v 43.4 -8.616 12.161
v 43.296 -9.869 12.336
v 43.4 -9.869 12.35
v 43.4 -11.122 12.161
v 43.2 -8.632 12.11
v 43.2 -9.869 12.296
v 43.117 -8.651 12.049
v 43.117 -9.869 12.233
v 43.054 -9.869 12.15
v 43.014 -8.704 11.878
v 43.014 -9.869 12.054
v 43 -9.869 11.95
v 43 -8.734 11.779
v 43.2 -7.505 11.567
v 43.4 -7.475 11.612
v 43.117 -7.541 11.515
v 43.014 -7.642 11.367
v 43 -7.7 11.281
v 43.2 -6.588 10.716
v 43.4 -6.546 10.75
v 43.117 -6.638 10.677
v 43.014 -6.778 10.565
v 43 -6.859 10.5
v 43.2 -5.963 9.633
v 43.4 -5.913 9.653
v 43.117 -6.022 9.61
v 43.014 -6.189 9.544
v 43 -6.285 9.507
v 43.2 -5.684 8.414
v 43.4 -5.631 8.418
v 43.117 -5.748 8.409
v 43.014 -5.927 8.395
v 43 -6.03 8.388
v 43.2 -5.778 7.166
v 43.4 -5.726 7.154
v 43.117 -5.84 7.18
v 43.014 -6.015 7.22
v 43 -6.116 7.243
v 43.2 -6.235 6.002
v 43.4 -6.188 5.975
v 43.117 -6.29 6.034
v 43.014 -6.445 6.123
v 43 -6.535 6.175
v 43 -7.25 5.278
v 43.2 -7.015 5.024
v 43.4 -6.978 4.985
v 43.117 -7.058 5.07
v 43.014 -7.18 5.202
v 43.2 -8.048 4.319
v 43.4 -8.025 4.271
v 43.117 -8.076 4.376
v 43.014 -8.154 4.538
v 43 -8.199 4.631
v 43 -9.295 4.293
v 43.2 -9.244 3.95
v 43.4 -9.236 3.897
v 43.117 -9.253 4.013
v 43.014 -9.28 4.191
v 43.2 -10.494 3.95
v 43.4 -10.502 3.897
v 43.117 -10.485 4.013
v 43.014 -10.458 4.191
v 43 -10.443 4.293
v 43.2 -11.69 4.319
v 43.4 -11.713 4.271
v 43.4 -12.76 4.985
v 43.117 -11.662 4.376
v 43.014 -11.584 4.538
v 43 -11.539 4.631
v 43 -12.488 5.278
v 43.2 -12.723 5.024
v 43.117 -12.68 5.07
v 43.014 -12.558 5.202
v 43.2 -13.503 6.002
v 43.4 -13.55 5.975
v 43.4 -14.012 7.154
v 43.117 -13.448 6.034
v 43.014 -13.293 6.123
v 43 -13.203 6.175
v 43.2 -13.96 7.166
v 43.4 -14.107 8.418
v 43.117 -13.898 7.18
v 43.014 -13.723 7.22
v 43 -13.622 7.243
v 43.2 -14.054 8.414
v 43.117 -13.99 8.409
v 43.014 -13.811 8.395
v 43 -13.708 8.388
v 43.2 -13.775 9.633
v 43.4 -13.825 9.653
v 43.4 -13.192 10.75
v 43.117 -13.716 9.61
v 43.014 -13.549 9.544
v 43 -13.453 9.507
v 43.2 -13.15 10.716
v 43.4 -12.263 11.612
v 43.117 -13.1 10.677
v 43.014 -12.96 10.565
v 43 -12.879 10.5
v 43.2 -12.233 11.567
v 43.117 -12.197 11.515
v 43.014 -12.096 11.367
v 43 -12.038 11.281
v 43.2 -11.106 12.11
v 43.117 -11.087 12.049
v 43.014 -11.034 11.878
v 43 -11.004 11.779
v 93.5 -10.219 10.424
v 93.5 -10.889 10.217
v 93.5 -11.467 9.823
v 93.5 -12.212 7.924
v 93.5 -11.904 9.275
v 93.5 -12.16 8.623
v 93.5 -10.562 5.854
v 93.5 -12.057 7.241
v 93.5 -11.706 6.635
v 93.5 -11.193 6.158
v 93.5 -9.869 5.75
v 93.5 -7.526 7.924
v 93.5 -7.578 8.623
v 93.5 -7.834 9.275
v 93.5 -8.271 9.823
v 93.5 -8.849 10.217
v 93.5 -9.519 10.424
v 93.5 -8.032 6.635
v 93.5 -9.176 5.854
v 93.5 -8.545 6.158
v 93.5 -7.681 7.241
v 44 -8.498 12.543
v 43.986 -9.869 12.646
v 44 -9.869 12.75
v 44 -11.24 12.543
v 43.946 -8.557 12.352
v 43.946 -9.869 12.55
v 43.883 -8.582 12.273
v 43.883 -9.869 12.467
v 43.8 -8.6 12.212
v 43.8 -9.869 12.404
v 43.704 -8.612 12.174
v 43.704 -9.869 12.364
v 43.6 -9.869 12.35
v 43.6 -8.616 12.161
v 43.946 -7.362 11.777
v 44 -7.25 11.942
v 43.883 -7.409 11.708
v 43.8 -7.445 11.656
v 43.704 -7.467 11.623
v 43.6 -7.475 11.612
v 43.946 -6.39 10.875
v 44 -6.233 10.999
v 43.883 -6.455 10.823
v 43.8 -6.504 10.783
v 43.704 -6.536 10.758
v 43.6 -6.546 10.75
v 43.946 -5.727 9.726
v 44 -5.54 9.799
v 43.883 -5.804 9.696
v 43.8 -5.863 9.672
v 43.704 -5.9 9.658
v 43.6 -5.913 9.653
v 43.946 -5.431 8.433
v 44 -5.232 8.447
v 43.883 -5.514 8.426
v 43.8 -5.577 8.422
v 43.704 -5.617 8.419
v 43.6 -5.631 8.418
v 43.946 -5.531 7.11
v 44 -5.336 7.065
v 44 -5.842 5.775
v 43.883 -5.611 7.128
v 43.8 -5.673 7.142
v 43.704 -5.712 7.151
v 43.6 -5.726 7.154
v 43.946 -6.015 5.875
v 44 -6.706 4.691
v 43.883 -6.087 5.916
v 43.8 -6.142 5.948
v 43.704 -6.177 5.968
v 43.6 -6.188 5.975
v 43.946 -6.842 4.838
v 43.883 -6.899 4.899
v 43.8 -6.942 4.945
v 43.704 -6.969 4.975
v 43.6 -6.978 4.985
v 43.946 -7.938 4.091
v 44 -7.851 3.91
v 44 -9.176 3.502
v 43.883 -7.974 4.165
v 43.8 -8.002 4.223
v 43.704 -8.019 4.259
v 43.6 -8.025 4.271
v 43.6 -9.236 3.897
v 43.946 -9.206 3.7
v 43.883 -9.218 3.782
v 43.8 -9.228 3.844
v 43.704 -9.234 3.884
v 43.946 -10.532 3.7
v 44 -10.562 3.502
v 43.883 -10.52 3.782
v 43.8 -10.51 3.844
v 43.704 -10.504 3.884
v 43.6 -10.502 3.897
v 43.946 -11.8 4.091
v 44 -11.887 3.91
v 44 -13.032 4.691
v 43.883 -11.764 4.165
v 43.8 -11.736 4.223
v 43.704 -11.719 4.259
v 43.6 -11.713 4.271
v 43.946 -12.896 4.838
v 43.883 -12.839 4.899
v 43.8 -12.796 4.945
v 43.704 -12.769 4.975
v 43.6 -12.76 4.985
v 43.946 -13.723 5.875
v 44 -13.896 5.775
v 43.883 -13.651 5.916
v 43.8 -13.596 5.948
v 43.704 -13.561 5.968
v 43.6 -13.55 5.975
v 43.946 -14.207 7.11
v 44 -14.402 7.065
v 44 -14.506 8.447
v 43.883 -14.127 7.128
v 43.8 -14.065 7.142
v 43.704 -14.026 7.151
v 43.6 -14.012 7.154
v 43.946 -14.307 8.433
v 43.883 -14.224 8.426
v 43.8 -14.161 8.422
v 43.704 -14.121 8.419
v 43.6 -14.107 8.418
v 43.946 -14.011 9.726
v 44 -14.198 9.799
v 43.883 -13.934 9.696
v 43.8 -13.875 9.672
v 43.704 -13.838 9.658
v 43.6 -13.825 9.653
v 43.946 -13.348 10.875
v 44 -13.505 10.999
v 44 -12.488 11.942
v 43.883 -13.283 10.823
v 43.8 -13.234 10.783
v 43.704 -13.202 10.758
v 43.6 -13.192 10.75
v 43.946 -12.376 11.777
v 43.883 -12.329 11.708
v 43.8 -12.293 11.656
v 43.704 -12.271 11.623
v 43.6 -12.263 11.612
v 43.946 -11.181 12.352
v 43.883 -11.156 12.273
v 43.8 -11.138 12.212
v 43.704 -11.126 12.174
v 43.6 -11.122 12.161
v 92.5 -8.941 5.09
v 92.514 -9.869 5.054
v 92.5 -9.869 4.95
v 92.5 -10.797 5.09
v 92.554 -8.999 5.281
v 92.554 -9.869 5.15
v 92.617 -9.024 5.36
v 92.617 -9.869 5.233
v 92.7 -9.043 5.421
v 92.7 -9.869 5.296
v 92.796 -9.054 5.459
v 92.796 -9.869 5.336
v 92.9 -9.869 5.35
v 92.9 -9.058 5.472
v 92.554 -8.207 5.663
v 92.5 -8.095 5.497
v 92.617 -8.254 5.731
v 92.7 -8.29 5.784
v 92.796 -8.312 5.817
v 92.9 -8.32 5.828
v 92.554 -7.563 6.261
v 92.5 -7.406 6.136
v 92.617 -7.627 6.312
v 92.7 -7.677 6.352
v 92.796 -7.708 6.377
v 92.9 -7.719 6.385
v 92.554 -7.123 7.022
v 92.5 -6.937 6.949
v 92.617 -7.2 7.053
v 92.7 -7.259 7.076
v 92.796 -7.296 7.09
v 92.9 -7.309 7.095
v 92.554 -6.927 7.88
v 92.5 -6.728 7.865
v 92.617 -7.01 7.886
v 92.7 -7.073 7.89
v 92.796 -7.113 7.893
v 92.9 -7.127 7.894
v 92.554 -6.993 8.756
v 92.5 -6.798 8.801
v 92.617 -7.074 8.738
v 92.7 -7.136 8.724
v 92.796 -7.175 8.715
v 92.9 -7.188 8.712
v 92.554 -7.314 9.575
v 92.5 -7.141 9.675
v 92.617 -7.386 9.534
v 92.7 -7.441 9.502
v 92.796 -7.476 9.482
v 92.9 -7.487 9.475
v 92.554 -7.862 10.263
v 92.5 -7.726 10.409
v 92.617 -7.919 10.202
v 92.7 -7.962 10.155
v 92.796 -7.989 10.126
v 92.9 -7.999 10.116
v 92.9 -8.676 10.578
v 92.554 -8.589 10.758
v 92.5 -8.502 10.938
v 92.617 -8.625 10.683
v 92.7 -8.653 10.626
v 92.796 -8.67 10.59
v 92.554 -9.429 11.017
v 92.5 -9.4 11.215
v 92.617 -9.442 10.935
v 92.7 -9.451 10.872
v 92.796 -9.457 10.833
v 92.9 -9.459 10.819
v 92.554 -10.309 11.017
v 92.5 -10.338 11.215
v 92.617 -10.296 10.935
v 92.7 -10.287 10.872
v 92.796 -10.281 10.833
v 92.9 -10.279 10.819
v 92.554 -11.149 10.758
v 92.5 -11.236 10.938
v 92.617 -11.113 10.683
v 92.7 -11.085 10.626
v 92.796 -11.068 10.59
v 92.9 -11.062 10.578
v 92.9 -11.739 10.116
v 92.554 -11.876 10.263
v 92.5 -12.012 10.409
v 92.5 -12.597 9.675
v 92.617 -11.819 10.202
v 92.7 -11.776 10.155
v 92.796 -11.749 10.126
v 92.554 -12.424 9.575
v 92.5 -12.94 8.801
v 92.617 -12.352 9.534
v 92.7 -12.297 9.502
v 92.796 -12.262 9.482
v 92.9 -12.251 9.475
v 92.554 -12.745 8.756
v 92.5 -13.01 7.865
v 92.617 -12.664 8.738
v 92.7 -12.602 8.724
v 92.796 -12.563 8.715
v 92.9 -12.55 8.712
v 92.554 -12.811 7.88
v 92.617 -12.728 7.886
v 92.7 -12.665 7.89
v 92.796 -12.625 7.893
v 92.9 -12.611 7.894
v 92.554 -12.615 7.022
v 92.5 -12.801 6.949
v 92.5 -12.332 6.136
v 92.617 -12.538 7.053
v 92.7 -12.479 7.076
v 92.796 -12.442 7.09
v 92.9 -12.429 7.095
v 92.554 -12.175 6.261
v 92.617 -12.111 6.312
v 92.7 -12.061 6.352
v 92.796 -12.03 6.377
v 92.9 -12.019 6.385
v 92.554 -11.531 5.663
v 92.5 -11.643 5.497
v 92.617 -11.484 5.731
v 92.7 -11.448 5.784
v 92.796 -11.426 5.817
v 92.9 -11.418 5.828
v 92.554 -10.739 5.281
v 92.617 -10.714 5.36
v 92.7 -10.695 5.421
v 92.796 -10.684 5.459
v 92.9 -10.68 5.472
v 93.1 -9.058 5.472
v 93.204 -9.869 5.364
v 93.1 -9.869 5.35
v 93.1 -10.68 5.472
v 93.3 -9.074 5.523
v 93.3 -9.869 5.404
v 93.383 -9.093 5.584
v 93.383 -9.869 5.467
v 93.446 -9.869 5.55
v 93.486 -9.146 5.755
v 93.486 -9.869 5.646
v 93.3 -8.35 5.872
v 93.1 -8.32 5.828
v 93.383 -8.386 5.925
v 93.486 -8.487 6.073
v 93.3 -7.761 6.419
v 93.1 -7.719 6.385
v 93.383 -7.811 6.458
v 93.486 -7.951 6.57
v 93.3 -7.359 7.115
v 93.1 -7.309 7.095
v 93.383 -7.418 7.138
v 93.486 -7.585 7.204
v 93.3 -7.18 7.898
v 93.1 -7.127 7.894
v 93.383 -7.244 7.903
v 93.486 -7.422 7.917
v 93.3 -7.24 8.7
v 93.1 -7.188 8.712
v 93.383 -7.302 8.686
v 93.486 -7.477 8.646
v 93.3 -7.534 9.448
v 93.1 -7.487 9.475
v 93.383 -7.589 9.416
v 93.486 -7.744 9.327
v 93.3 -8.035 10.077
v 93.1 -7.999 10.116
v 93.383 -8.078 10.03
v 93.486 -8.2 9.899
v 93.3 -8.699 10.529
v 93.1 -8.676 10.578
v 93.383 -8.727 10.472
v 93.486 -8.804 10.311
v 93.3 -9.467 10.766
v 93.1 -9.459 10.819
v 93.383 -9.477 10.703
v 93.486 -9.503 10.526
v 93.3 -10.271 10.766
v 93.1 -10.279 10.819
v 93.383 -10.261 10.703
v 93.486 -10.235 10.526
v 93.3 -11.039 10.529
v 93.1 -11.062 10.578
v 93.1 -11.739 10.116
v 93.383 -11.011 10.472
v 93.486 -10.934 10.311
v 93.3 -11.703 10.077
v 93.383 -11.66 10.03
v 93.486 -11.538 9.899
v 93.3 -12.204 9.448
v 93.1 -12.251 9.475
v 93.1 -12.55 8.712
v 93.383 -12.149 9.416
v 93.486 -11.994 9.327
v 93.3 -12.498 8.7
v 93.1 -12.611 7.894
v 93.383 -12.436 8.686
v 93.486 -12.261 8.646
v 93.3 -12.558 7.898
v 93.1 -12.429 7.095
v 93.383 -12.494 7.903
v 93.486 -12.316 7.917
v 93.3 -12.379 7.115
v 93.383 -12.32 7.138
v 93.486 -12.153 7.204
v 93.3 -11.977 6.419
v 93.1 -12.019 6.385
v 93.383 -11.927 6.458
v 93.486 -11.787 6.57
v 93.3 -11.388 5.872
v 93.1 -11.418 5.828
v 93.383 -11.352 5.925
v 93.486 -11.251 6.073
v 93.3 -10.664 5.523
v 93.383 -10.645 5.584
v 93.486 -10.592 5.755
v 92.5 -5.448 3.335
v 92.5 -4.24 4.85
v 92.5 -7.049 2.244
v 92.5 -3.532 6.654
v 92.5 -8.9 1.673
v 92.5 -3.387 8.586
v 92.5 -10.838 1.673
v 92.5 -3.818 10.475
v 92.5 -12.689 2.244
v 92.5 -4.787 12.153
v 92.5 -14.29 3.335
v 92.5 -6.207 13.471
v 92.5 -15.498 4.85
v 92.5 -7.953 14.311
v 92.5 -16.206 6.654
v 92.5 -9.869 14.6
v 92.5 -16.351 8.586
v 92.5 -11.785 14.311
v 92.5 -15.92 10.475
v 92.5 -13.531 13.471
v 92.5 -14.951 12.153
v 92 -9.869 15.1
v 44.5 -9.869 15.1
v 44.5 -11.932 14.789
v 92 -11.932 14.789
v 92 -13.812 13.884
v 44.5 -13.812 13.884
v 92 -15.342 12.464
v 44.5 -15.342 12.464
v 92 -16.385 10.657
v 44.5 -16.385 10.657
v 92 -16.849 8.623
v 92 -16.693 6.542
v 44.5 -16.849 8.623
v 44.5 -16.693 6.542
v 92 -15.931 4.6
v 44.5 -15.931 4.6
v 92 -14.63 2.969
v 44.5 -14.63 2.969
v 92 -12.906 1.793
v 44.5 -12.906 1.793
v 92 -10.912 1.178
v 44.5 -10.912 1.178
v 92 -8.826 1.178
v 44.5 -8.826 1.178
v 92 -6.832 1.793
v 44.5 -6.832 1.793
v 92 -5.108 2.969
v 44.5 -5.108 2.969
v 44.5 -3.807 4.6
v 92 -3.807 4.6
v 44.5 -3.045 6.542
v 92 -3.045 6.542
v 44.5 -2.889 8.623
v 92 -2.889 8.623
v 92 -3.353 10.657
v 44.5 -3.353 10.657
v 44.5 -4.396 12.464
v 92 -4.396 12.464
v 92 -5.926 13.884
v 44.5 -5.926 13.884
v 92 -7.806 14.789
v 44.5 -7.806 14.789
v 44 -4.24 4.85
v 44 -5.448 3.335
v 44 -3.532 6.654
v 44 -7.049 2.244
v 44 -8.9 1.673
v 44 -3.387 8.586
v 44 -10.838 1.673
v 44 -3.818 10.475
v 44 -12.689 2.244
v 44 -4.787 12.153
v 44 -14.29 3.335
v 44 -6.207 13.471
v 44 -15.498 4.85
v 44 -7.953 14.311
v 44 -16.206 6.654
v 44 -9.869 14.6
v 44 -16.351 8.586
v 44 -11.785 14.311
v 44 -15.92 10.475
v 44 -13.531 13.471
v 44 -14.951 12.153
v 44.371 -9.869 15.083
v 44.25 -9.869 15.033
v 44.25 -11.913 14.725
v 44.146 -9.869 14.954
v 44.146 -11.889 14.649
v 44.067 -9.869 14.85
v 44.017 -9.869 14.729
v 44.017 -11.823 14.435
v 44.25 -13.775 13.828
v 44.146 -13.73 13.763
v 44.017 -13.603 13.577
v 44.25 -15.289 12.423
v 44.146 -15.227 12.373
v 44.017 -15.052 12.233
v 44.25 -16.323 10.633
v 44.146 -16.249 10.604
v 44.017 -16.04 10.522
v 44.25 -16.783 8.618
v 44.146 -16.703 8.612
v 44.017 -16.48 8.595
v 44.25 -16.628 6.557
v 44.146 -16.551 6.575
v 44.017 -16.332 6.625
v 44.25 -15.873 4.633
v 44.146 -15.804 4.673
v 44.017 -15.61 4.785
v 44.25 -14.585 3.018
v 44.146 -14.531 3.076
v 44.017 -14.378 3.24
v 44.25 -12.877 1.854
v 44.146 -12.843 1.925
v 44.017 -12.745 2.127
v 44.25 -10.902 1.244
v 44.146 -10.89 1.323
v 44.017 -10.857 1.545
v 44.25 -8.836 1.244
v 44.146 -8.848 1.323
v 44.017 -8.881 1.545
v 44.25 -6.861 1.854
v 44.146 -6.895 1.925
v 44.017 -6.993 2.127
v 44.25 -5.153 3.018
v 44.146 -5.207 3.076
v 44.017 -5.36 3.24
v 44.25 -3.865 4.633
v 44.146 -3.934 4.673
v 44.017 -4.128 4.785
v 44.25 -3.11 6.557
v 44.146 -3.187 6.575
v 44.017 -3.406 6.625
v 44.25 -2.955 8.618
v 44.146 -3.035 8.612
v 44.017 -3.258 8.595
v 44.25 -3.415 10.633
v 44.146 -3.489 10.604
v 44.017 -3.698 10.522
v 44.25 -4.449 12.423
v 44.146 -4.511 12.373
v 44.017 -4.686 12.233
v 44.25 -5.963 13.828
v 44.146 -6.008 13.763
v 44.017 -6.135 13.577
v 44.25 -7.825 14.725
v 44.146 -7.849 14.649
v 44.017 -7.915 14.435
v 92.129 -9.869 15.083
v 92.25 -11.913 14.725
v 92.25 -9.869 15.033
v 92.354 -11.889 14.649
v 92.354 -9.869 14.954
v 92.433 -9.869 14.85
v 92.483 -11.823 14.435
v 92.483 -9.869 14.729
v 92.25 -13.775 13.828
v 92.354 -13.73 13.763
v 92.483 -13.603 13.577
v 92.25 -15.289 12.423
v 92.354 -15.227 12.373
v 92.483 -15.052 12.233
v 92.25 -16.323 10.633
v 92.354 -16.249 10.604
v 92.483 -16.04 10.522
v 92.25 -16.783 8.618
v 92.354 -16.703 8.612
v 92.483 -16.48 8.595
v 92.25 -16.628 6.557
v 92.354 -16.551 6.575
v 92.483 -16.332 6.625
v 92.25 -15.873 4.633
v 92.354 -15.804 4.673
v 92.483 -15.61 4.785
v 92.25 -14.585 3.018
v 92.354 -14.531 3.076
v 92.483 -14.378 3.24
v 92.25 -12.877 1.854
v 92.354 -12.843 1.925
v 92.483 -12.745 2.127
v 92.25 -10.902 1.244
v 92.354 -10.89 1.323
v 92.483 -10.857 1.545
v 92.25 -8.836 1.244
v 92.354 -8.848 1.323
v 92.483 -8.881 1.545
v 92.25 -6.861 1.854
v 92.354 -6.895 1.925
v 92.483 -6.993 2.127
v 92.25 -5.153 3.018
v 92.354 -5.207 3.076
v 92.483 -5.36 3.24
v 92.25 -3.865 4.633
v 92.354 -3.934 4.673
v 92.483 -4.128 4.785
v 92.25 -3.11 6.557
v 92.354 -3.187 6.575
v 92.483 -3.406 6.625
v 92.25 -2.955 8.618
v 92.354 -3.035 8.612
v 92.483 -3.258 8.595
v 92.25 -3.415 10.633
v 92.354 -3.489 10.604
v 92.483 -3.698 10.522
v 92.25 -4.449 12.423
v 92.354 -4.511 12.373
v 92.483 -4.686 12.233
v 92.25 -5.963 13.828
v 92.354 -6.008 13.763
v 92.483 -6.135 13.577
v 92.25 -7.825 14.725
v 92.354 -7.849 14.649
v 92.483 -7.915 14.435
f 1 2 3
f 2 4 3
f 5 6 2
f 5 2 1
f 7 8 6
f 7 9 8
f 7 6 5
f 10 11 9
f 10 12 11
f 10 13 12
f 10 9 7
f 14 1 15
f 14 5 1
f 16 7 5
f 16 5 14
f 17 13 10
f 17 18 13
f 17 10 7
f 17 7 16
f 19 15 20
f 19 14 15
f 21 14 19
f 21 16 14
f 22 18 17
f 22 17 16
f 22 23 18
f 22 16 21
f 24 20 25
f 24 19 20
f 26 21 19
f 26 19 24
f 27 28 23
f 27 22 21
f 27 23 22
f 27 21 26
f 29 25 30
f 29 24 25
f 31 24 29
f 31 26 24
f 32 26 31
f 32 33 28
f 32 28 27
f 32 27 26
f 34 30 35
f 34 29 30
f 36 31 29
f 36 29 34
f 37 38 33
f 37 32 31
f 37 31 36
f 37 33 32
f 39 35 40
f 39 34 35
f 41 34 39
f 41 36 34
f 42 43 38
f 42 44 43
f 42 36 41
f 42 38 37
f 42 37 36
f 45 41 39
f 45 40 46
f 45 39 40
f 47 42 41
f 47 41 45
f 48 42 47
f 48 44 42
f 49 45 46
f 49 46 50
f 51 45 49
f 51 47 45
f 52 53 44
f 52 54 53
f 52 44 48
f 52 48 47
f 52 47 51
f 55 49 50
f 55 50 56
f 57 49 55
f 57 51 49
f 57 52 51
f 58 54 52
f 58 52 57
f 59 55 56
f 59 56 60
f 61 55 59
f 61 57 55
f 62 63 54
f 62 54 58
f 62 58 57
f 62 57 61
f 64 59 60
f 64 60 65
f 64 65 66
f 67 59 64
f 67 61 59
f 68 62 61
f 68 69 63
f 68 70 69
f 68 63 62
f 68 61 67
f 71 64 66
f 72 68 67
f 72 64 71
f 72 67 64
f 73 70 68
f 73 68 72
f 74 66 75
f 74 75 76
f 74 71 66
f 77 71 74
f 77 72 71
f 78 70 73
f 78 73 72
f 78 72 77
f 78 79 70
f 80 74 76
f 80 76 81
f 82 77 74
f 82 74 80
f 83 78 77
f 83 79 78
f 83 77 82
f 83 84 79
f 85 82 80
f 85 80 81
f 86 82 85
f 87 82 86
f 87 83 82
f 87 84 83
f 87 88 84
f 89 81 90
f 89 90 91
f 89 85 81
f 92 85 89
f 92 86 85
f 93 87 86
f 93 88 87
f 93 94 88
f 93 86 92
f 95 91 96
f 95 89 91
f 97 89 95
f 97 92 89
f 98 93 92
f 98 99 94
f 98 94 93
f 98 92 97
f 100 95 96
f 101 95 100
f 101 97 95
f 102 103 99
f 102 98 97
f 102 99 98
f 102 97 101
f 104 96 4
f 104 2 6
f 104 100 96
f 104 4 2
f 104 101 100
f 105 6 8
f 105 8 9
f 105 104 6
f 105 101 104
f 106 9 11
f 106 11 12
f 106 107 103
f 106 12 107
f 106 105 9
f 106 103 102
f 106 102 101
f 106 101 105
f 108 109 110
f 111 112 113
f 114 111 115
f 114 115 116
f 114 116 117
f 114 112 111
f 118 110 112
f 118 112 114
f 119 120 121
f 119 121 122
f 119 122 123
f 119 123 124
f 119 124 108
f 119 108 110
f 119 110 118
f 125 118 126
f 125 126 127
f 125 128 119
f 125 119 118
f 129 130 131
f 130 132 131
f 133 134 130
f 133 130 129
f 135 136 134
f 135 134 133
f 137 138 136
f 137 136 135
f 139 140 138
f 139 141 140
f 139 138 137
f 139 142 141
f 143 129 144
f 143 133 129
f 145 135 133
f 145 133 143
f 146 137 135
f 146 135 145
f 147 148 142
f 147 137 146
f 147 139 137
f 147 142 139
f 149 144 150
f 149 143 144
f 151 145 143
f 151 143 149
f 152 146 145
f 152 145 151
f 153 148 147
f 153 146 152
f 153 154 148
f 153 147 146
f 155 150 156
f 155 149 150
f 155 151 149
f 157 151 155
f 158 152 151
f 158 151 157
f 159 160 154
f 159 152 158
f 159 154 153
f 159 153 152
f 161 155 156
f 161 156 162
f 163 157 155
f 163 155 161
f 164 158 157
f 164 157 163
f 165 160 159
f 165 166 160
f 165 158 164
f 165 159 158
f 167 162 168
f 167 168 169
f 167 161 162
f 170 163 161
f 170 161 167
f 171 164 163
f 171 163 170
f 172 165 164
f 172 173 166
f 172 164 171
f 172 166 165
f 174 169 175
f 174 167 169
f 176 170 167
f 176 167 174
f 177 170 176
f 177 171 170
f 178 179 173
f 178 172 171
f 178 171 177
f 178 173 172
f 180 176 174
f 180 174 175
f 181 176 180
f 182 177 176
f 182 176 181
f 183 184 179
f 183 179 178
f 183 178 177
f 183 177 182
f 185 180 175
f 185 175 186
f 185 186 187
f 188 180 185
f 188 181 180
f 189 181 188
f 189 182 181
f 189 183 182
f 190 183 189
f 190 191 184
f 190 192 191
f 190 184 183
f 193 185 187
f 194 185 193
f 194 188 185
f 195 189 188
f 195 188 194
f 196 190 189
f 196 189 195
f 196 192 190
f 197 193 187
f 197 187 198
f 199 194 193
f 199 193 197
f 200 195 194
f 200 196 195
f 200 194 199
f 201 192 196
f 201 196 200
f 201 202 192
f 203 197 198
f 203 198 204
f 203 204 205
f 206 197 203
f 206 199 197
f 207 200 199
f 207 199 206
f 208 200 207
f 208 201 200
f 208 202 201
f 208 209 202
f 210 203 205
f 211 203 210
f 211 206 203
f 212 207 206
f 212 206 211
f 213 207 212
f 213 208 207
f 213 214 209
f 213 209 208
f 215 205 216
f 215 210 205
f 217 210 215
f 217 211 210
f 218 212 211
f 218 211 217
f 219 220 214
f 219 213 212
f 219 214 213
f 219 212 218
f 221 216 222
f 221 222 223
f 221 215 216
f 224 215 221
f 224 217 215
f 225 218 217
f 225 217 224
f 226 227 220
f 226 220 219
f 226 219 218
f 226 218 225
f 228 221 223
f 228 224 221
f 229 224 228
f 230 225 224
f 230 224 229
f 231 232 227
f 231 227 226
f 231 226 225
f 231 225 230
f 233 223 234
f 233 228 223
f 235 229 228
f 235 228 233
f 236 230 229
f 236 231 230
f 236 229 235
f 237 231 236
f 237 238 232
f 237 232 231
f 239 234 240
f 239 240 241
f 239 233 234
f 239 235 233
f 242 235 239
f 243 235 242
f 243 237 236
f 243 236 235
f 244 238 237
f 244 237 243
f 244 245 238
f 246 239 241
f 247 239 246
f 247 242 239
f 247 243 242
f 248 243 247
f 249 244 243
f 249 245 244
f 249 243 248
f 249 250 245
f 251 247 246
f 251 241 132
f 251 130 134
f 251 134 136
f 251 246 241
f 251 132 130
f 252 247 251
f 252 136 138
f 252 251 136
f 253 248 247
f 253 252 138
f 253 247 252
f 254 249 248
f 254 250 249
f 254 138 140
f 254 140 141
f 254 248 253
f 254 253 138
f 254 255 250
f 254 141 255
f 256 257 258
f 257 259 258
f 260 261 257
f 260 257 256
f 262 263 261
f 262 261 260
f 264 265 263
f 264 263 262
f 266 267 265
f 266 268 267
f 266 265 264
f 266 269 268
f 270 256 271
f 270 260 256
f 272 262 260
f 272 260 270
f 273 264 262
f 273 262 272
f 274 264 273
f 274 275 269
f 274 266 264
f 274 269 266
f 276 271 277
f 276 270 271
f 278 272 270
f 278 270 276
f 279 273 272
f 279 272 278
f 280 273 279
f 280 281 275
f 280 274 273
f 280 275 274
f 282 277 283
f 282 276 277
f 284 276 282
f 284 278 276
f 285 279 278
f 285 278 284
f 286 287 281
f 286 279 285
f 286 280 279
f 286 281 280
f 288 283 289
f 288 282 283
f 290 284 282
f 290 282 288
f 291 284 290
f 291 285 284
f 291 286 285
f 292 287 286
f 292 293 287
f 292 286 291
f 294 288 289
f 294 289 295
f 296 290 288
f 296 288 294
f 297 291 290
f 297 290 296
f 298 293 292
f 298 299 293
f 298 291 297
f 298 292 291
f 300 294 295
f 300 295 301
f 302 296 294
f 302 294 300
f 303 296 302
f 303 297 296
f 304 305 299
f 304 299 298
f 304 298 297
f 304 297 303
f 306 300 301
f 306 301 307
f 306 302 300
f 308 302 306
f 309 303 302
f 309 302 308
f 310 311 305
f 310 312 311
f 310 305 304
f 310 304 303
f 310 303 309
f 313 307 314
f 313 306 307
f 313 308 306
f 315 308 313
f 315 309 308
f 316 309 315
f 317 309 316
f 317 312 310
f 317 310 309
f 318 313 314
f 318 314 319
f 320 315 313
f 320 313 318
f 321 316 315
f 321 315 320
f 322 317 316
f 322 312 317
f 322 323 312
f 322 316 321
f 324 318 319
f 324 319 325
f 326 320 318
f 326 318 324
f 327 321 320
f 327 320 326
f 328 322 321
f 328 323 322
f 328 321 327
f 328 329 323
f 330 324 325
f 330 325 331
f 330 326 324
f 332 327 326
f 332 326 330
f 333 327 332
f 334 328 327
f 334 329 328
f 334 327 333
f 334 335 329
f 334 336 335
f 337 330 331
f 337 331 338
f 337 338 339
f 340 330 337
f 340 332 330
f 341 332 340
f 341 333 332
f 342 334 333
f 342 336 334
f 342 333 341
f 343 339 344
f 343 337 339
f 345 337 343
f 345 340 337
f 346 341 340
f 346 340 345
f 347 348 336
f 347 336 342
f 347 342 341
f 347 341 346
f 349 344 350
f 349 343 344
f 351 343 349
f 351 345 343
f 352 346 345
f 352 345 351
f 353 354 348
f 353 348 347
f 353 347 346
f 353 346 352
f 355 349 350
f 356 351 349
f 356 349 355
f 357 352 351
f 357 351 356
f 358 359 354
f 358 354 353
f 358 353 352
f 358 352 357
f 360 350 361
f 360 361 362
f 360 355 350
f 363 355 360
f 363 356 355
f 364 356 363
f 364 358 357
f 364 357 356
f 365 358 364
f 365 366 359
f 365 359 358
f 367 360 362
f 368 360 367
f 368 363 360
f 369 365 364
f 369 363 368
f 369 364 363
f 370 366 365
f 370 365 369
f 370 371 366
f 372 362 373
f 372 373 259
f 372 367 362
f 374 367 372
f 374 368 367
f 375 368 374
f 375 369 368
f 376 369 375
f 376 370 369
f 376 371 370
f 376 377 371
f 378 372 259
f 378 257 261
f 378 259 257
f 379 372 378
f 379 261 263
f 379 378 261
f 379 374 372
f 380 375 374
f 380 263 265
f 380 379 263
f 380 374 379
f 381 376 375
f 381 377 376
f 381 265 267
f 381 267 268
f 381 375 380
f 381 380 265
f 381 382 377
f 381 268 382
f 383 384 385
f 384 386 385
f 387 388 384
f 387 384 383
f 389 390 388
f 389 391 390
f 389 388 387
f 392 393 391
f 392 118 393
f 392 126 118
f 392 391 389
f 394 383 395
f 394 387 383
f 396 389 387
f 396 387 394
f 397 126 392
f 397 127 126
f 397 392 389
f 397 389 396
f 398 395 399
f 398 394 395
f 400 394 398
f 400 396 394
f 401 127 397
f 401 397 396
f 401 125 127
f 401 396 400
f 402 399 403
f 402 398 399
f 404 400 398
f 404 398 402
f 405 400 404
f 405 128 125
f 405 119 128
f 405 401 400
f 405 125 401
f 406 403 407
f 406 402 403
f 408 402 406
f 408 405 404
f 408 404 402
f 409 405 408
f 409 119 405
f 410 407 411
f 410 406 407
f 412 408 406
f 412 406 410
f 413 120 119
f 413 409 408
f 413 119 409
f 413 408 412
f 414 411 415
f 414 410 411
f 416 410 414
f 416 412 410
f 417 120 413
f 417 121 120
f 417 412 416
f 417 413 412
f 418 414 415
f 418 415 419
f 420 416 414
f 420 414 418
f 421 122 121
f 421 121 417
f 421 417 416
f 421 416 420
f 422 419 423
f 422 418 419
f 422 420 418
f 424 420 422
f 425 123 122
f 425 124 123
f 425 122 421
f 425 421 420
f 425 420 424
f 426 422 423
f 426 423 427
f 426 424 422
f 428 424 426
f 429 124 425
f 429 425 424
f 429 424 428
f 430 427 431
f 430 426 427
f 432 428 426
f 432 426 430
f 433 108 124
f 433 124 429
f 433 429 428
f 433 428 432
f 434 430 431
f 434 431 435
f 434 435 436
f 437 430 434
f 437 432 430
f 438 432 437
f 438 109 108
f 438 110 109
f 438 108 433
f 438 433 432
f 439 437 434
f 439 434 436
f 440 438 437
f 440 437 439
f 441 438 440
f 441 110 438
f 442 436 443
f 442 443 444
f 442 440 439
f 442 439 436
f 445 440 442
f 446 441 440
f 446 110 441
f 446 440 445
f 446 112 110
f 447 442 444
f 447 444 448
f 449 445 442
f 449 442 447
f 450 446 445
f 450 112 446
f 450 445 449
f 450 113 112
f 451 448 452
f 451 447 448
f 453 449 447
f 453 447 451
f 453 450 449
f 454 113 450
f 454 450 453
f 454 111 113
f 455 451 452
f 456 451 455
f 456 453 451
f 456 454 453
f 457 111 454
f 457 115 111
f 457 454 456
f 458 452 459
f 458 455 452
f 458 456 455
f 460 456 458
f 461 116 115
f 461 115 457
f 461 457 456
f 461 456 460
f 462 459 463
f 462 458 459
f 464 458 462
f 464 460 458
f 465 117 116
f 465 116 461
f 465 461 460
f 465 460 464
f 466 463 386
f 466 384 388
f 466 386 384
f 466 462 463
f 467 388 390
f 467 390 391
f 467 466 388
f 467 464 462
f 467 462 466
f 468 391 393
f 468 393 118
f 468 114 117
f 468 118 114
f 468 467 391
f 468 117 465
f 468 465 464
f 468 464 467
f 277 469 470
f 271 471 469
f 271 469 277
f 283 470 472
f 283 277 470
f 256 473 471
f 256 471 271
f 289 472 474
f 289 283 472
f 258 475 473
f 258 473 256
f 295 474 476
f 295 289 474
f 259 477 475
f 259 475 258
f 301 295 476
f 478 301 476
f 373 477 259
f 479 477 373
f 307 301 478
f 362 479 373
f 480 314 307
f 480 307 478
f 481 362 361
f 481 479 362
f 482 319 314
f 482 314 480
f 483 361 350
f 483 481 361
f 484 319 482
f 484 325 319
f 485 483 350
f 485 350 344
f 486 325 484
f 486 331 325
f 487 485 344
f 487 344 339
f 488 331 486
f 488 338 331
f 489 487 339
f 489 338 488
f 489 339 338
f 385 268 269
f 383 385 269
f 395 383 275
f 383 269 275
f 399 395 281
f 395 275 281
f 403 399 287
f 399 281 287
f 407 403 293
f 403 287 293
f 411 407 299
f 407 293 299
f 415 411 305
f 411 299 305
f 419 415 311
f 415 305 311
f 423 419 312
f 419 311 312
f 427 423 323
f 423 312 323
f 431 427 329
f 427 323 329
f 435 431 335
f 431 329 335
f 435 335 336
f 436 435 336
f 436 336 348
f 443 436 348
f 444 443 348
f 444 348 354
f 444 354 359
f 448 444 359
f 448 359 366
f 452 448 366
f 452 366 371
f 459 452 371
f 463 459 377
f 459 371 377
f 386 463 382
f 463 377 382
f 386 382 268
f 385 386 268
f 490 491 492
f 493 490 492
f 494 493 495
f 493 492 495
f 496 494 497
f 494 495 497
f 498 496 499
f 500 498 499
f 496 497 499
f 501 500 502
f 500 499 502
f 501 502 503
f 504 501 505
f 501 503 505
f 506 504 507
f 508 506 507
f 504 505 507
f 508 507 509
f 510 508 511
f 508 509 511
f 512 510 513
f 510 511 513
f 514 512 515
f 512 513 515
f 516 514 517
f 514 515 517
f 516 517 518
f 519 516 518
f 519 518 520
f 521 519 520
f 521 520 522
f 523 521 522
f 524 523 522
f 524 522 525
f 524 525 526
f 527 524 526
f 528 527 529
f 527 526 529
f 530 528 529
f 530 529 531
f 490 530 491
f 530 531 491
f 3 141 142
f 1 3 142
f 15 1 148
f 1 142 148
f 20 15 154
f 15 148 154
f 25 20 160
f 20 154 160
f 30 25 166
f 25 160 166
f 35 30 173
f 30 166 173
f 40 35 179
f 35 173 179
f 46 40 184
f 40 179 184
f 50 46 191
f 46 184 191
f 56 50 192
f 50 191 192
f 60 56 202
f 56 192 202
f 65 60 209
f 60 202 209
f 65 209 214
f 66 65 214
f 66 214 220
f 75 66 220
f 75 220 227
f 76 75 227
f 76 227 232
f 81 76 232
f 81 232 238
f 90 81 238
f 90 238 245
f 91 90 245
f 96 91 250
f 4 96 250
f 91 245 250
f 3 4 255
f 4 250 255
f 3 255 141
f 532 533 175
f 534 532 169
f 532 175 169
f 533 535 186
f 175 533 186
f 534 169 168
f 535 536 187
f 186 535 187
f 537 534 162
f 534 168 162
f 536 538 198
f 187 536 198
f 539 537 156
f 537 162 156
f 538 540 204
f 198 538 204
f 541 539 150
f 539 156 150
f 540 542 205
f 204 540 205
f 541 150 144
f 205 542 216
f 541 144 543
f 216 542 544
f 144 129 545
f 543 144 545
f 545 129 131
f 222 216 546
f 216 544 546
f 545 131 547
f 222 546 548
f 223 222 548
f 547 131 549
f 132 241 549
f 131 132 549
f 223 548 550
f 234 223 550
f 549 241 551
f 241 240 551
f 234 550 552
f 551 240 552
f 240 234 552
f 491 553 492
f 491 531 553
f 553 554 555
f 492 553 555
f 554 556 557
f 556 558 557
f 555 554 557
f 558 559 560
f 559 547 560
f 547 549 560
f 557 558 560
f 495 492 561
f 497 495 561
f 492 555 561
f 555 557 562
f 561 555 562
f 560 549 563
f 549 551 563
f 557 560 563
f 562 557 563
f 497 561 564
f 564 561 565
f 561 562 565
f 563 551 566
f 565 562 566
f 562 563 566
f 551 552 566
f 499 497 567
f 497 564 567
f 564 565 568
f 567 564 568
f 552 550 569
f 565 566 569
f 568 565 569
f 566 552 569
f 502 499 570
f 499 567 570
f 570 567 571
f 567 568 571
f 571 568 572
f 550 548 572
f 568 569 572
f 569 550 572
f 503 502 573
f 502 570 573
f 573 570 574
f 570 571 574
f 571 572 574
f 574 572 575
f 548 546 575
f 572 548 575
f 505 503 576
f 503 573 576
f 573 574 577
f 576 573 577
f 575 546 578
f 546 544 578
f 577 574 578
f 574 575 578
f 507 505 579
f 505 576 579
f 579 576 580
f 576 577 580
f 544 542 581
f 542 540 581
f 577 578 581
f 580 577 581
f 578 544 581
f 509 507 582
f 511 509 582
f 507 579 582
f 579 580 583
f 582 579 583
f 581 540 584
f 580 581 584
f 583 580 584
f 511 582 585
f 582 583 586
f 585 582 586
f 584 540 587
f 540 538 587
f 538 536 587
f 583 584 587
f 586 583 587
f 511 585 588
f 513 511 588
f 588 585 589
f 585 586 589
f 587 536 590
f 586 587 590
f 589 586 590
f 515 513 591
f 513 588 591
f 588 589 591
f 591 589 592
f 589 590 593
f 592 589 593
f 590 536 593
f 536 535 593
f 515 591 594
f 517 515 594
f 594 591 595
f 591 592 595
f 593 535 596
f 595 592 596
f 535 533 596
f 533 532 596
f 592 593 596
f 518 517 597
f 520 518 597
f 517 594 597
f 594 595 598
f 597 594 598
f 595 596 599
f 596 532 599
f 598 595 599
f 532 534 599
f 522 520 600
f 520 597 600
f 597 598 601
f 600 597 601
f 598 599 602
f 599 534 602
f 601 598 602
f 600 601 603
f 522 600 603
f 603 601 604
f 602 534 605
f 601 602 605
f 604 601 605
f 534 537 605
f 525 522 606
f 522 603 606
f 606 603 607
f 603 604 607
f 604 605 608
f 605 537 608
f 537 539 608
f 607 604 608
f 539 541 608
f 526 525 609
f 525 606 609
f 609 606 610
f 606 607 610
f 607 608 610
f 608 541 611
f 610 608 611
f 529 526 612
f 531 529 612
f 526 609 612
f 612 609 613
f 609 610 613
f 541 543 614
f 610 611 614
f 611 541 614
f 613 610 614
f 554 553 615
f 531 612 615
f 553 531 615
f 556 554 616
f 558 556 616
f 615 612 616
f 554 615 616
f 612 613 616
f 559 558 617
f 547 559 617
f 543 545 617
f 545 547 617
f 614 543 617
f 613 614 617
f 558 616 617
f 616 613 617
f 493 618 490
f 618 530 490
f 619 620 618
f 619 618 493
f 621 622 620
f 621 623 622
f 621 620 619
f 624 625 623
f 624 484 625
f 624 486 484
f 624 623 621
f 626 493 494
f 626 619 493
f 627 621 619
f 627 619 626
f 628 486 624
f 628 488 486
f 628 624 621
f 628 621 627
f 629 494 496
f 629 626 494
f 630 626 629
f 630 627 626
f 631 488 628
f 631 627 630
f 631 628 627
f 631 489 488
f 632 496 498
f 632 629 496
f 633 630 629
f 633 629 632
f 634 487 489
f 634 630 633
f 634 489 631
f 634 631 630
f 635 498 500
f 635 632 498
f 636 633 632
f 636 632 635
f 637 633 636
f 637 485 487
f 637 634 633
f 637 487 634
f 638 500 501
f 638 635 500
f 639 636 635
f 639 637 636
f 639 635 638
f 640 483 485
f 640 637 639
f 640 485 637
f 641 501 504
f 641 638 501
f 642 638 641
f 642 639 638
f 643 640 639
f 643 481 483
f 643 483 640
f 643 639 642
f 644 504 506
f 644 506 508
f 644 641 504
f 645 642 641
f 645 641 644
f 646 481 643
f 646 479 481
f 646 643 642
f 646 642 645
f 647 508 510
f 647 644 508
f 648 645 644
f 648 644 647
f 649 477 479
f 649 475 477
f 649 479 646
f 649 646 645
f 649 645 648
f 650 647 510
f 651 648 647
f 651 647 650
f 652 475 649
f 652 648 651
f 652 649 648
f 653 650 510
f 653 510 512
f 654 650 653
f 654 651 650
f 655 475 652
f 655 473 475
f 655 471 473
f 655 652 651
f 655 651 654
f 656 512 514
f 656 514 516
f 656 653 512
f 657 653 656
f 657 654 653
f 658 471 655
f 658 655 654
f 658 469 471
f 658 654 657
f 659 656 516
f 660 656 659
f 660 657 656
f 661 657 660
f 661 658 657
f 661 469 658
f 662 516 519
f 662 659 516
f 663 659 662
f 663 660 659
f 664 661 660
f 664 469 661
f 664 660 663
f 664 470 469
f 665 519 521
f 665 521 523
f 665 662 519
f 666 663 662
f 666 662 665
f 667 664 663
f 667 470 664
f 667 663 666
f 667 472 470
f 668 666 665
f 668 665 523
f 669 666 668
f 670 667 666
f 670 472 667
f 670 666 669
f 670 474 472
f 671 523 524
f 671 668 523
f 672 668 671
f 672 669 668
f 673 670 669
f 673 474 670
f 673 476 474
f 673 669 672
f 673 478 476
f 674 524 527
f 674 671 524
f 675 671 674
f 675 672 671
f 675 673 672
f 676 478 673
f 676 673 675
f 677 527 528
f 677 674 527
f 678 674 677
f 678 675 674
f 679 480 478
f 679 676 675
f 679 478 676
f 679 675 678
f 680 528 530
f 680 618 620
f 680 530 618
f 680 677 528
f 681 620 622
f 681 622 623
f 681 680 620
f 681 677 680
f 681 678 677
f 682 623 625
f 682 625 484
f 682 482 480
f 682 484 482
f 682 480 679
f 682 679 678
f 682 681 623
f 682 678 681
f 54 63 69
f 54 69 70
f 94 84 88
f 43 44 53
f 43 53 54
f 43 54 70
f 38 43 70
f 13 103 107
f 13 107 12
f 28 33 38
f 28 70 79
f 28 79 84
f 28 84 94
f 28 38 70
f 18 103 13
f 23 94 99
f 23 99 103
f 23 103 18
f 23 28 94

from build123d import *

# Parameters (mm, degrees)
BOSS_EXTRUDE1_DEPTH     = 2.75
SKETCH2_W               = 120
SKETCH2_H               = 29
CUT_EXTRUDE1_DEPTH      = 0.125
SKETCH3_W               = 120
SKETCH3_H               = 29
BOSS_EXTRUDE2_DEPTH     = 0.125
CUT_EXTRUDE2_DEPTH      = 1.356
FILLET1_R               = 2
BOSS_EXTRUDE3_DEPTH     = 0.1
SKETCH6_W               = 0.5
SKETCH6_H               = 5
BOSS_EXTRUDE4_DEPTH     = 0.1
BOSS_EXTRUDE4_2_DEPTH   = 0.1
BOSS_EXTRUDE4_3_DEPTH   = 0.1
SKETCH7_W               = 30
SKETCH7_H               = 10
BOSS_EXTRUDE5_DEPTH     = 0.1
SKETCH8_RX              = 5
SKETCH8_RY              = 4
CUT_EXTRUDE3_DEPTH      = 1.15
CUT_EXTRUDE4_DEPTH      = 121.904145917
CUT_EXTRUDE4_DEPTH_BACK = 121.904145917
SKETCH9_W               = 0.2
SKETCH9_H               = 2
SKETCH10_W              = 120
SKETCH10_H              = 29
BOSS_EXTRUDE6_DEPTH     = 1.619
BOSS_EXTRUDE7_START     = 45
SKETCH11_R              = 7
BOSS_EXTRUDE7_DEPTH     = 48.5
SKETCH12_R              = 4.25
BOSS_EXTRUDE8_DEPTH     = 1
SKETCH13_R              = 2.75
BOSS_EXTRUDE9_DEPTH     = 1
BOSS_EXTRUDE10_START    = 44
SKETCH14_R              = 7
BOSS_EXTRUDE10_DEPTH    = 48.5
SKETCH15_R              = 2.75
BOSS_EXTRUDE11_DEPTH    = 1
SKETCH16_R              = 4.25
BOSS_EXTRUDE12_DEPTH    = 1
FILLET2_R               = 0.5
FILLET3_R               = 0.5
FILLET4_R               = 0.4
FILLET5_R               = 0.4
FILLET6_R               = 0.4
FILLET7_R               = 0.4


with BuildPart() as part:
    # Sketch1 → Boss-Extrude1 (new body)
    with BuildSketch(Plane(origin=(0, 0, 0), x_dir=(1, 0, 0), z_dir=(0, 1, 0))):
        Polygon((0, 0), (0, -14.5), (120, -14.5), (120, 14.5), (0, 14.5), align=None)
    extrude(amount=BOSS_EXTRUDE1_DEPTH)

    # Sketch2 → Cut-Extrude1 (cut)
    with BuildSketch(Plane(origin=(0, 2.75, 0), x_dir=(1, 0, 0), z_dir=(0, 1, 0))):
        with Locations((60, 0)):
            Rectangle(SKETCH2_W, SKETCH2_H)
    extrude(amount=-CUT_EXTRUDE1_DEPTH, mode=Mode.SUBTRACT)

    # Sketch4 → Cut-Extrude2 (cut)
    with BuildSketch(Plane(origin=(0, 2.625, 0), x_dir=(1, 0, 0), z_dir=(0, 1, 0))):
        Polygon((77.5, 0), (77.5, -2.5), (92.5, -2.5), (92.5, 2.5), (77.5, 2.5), align=None)
    extrude(amount=-CUT_EXTRUDE2_DEPTH, mode=Mode.SUBTRACT)

    # Fillet1
    fillet1_edges = [part.edges().sort_by_distance(p)[0] for p in [
        (77.5, 1.947, -2.5),
        (92.5, 1.947, -2.5),
        (92.5, 1.947, 2.5),
        (77.5, 1.947, 2.5),
    ]]
    fillet(fillet1_edges, radius=FILLET1_R)

    # Sketch8 → Cut-Extrude3 (cut)
    with BuildSketch(Plane(origin=(0, 2.625, 0), x_dir=(1, 0, 0), z_dir=(0, 1, 0))):
        with Locations(Location((16.87, 0), (0, 0, -90))):
            Ellipse(SKETCH8_RX, SKETCH8_RY)
    extrude(amount=-CUT_EXTRUDE3_DEPTH, mode=Mode.SUBTRACT)


with BuildPart() as body_2:
    # Sketch3 → Boss-Extrude2 (new body)
    with BuildSketch(Plane(origin=(0, 2.625, 0), x_dir=(1, 0, 0), z_dir=(0, 1, 0))):
        with Locations((60, 0)):
            Rectangle(SKETCH3_W, SKETCH3_H)
    extrude(amount=BOSS_EXTRUDE2_DEPTH)

    # Sketch9 → Cut-Extrude4 (cut, two sides: drawn at the far end of the back side and taken through both)
    with BuildSketch(Plane(origin=(0, 2.75, 0), x_dir=(1, 0, 0), z_dir=(0, 1, 0)).offset(-CUT_EXTRUDE4_DEPTH_BACK)):
        with Locations((35, 3.5)):
            Rectangle(SKETCH9_W, SKETCH9_H)
        with Locations((35, 0)):
            Rectangle(SKETCH9_W, SKETCH9_H)
        with Locations((35, 7)):
            Rectangle(SKETCH9_W, SKETCH9_H)
        with Locations((35, 10.5)):
            Rectangle(SKETCH9_W, SKETCH9_H)
        with Locations((35, 14)):
            Rectangle(SKETCH9_W, SKETCH9_H)
        with Locations((35, -10.5)):
            Rectangle(SKETCH9_W, SKETCH9_H)
        with Locations((35, -14)):
            Rectangle(SKETCH9_W, SKETCH9_H)
        with Locations((35, -7)):
            Rectangle(SKETCH9_W, SKETCH9_H)
        with Locations((35, -3.5)):
            Rectangle(SKETCH9_W, SKETCH9_H)
    extrude(amount=CUT_EXTRUDE4_DEPTH + CUT_EXTRUDE4_DEPTH_BACK, mode=Mode.SUBTRACT)


with BuildPart() as body_3:
    # Sketch5 → Boss-Extrude3 (new body)
    with BuildSketch(Plane(origin=(0, 1.269, 0), x_dir=(1, 0, 0), z_dir=(0, 1, 0))):
        with BuildLine():
            Line((90.5, 2.5), (79.5, 2.5))
            ThreePointArc((79.5, 2.5), (78.085786438, 1.914213562), (77.5, 0.5))
            Line((77.5, 0.5), (77.5, -0.5))
            ThreePointArc((77.5, -0.5), (78.085786438, -1.914213562), (79.5, -2.5))
            Line((79.5, -2.5), (90.5, -2.5))
            ThreePointArc((90.5, -2.5), (91.914213562, -1.914213562), (92.5, -0.5))
            Line((92.5, -0.5), (92.5, 0.5))
            ThreePointArc((92.5, 0.5), (91.914213562, 1.914213562), (90.5, 2.5))
        make_face()
    extrude(amount=BOSS_EXTRUDE3_DEPTH)


with BuildPart() as body_4:
    # Sketch6 → Boss-Extrude4 (new body)
    with BuildSketch(Plane(origin=(0, 1.369, 0), x_dir=(1, 0, 0), z_dir=(0, 1, 0))):
        with Locations((90, 0)):
            Rectangle(SKETCH6_W, SKETCH6_H)
    extrude(amount=BOSS_EXTRUDE4_DEPTH)


with BuildPart() as body_5:
    # Sketch6 → Boss-Extrude4 2 (new body)
    with BuildSketch(Plane(origin=(0, 1.369, 0), x_dir=(1, 0, 0), z_dir=(0, 1, 0))):
        with Locations((85, 0)):
            Rectangle(SKETCH6_W, SKETCH6_H)
    extrude(amount=BOSS_EXTRUDE4_2_DEPTH)


with BuildPart() as body_6:
    # Sketch6 → Boss-Extrude4 3 (new body)
    with BuildSketch(Plane(origin=(0, 1.369, 0), x_dir=(1, 0, 0), z_dir=(0, 1, 0))):
        with Locations((80, 0)):
            Rectangle(SKETCH6_W, SKETCH6_H)
    extrude(amount=BOSS_EXTRUDE4_3_DEPTH)


with BuildPart() as body_7:
    # Sketch7 → Boss-Extrude5 (new body)
    with BuildSketch(Plane(origin=(0, 2.625, 0), x_dir=(1, 0, 0), z_dir=(0, 1, 0))):
        with Locations((44, 0)):
            Rectangle(SKETCH7_W, SKETCH7_H)
    extrude(amount=BOSS_EXTRUDE5_DEPTH)


with BuildPart() as body_8:
    # Sketch10 → Boss-Extrude6 (new body)
    with BuildSketch(Plane.XZ):
        with Locations((60, 0)):
            Rectangle(SKETCH10_W, SKETCH10_H)
    extrude(amount=BOSS_EXTRUDE6_DEPTH)


with BuildPart() as body_9:
    # Sketch11 → Boss-Extrude7 (new body)
    with BuildSketch(Plane(origin=(0, 0, 0), x_dir=(0, 0, -1), z_dir=(1, 0, 0)).offset(BOSS_EXTRUDE7_START)):
        with Locations(Location((8.1, -9.869, 0), (0, 0, 180))):
            Circle(SKETCH11_R)
    extrude(amount=BOSS_EXTRUDE7_DEPTH)

    # Sketch12 → Boss-Extrude8 (add)
    with BuildSketch(Plane(origin=(93.5, 0, 0), x_dir=(0, 0, -1), z_dir=(1, 0, 0))):
        with Locations((8.1, -9.869)):
            Circle(SKETCH12_R)
    extrude(amount=BOSS_EXTRUDE8_DEPTH)

    # Sketch13 → Boss-Extrude9 (add)
    with BuildSketch(Plane.ZY.offset(-45)):
        with Locations((-8.1, -9.869)):
            Circle(SKETCH13_R)
    extrude(amount=BOSS_EXTRUDE9_DEPTH)

    # Fillet3
    fillet3_edges = [body_9.edges().sort_by_distance(p)[0] for p in [
        (45, -9.869, -15.1),
        (93.5, -9.869, -15.1),
    ]]
    fillet(fillet3_edges, radius=FILLET3_R)

    # Fillet5
    fillet5_edges = [body_9.edges().sort_by_distance(p)[0] for p in [
        (93.5, -9.869, -3.85),
        (94.5, -9.869, -3.85),
    ]]
    fillet(fillet5_edges, radius=FILLET5_R)

    # Fillet6
    fillet6_edges = [body_9.edges().sort_by_distance(p)[0] for p in [
        (45, -9.869, -10.85),
        (44, -9.869, -10.85),
    ]]
    fillet(fillet6_edges, radius=FILLET6_R)


with BuildPart() as body_10:
    # Sketch14 → Boss-Extrude10 (new body)
    with BuildSketch(Plane(origin=(0, 0, 0), x_dir=(0, 0, -1), z_dir=(1, 0, 0)).offset(BOSS_EXTRUDE10_START)):
        with Locations(Location((-8.1, -9.869, 0), (0, 0, 180))):
            Circle(SKETCH14_R)
    extrude(amount=BOSS_EXTRUDE10_DEPTH)

    # Sketch15 → Boss-Extrude11 (add)
    with BuildSketch(Plane(origin=(92.5, 0, 0), x_dir=(0, 0, -1), z_dir=(1, 0, 0))):
        with Locations((-8.1, -9.869)):
            Circle(SKETCH15_R)
    extrude(amount=BOSS_EXTRUDE11_DEPTH)

    # Sketch16 → Boss-Extrude12 (add)
    with BuildSketch(Plane.ZY.offset(-44)):
        with Locations((8.1, -9.869)):
            Circle(SKETCH16_R)
    extrude(amount=BOSS_EXTRUDE12_DEPTH)

    # Fillet2
    fillet2_edges = [body_10.edges().sort_by_distance(p)[0] for p in [
        (44, -9.869, 1.1),
        (92.5, -9.869, 1.1),
    ]]
    fillet(fillet2_edges, radius=FILLET2_R)

    # Fillet4
    fillet4_edges = [body_10.edges().sort_by_distance(p)[0] for p in [
        (92.5, -9.869, 10.85),
        (93.5, -9.869, 10.85),
    ]]
    fillet(fillet4_edges, radius=FILLET4_R)

    # Fillet7
    fillet7_edges = [body_10.edges().sort_by_distance(p)[0] for p in [
        (44, -9.869, 3.85),
        (43, -9.869, 3.85),
    ]]
    fillet(fillet7_edges, radius=FILLET7_R)


solid = body_10.part
